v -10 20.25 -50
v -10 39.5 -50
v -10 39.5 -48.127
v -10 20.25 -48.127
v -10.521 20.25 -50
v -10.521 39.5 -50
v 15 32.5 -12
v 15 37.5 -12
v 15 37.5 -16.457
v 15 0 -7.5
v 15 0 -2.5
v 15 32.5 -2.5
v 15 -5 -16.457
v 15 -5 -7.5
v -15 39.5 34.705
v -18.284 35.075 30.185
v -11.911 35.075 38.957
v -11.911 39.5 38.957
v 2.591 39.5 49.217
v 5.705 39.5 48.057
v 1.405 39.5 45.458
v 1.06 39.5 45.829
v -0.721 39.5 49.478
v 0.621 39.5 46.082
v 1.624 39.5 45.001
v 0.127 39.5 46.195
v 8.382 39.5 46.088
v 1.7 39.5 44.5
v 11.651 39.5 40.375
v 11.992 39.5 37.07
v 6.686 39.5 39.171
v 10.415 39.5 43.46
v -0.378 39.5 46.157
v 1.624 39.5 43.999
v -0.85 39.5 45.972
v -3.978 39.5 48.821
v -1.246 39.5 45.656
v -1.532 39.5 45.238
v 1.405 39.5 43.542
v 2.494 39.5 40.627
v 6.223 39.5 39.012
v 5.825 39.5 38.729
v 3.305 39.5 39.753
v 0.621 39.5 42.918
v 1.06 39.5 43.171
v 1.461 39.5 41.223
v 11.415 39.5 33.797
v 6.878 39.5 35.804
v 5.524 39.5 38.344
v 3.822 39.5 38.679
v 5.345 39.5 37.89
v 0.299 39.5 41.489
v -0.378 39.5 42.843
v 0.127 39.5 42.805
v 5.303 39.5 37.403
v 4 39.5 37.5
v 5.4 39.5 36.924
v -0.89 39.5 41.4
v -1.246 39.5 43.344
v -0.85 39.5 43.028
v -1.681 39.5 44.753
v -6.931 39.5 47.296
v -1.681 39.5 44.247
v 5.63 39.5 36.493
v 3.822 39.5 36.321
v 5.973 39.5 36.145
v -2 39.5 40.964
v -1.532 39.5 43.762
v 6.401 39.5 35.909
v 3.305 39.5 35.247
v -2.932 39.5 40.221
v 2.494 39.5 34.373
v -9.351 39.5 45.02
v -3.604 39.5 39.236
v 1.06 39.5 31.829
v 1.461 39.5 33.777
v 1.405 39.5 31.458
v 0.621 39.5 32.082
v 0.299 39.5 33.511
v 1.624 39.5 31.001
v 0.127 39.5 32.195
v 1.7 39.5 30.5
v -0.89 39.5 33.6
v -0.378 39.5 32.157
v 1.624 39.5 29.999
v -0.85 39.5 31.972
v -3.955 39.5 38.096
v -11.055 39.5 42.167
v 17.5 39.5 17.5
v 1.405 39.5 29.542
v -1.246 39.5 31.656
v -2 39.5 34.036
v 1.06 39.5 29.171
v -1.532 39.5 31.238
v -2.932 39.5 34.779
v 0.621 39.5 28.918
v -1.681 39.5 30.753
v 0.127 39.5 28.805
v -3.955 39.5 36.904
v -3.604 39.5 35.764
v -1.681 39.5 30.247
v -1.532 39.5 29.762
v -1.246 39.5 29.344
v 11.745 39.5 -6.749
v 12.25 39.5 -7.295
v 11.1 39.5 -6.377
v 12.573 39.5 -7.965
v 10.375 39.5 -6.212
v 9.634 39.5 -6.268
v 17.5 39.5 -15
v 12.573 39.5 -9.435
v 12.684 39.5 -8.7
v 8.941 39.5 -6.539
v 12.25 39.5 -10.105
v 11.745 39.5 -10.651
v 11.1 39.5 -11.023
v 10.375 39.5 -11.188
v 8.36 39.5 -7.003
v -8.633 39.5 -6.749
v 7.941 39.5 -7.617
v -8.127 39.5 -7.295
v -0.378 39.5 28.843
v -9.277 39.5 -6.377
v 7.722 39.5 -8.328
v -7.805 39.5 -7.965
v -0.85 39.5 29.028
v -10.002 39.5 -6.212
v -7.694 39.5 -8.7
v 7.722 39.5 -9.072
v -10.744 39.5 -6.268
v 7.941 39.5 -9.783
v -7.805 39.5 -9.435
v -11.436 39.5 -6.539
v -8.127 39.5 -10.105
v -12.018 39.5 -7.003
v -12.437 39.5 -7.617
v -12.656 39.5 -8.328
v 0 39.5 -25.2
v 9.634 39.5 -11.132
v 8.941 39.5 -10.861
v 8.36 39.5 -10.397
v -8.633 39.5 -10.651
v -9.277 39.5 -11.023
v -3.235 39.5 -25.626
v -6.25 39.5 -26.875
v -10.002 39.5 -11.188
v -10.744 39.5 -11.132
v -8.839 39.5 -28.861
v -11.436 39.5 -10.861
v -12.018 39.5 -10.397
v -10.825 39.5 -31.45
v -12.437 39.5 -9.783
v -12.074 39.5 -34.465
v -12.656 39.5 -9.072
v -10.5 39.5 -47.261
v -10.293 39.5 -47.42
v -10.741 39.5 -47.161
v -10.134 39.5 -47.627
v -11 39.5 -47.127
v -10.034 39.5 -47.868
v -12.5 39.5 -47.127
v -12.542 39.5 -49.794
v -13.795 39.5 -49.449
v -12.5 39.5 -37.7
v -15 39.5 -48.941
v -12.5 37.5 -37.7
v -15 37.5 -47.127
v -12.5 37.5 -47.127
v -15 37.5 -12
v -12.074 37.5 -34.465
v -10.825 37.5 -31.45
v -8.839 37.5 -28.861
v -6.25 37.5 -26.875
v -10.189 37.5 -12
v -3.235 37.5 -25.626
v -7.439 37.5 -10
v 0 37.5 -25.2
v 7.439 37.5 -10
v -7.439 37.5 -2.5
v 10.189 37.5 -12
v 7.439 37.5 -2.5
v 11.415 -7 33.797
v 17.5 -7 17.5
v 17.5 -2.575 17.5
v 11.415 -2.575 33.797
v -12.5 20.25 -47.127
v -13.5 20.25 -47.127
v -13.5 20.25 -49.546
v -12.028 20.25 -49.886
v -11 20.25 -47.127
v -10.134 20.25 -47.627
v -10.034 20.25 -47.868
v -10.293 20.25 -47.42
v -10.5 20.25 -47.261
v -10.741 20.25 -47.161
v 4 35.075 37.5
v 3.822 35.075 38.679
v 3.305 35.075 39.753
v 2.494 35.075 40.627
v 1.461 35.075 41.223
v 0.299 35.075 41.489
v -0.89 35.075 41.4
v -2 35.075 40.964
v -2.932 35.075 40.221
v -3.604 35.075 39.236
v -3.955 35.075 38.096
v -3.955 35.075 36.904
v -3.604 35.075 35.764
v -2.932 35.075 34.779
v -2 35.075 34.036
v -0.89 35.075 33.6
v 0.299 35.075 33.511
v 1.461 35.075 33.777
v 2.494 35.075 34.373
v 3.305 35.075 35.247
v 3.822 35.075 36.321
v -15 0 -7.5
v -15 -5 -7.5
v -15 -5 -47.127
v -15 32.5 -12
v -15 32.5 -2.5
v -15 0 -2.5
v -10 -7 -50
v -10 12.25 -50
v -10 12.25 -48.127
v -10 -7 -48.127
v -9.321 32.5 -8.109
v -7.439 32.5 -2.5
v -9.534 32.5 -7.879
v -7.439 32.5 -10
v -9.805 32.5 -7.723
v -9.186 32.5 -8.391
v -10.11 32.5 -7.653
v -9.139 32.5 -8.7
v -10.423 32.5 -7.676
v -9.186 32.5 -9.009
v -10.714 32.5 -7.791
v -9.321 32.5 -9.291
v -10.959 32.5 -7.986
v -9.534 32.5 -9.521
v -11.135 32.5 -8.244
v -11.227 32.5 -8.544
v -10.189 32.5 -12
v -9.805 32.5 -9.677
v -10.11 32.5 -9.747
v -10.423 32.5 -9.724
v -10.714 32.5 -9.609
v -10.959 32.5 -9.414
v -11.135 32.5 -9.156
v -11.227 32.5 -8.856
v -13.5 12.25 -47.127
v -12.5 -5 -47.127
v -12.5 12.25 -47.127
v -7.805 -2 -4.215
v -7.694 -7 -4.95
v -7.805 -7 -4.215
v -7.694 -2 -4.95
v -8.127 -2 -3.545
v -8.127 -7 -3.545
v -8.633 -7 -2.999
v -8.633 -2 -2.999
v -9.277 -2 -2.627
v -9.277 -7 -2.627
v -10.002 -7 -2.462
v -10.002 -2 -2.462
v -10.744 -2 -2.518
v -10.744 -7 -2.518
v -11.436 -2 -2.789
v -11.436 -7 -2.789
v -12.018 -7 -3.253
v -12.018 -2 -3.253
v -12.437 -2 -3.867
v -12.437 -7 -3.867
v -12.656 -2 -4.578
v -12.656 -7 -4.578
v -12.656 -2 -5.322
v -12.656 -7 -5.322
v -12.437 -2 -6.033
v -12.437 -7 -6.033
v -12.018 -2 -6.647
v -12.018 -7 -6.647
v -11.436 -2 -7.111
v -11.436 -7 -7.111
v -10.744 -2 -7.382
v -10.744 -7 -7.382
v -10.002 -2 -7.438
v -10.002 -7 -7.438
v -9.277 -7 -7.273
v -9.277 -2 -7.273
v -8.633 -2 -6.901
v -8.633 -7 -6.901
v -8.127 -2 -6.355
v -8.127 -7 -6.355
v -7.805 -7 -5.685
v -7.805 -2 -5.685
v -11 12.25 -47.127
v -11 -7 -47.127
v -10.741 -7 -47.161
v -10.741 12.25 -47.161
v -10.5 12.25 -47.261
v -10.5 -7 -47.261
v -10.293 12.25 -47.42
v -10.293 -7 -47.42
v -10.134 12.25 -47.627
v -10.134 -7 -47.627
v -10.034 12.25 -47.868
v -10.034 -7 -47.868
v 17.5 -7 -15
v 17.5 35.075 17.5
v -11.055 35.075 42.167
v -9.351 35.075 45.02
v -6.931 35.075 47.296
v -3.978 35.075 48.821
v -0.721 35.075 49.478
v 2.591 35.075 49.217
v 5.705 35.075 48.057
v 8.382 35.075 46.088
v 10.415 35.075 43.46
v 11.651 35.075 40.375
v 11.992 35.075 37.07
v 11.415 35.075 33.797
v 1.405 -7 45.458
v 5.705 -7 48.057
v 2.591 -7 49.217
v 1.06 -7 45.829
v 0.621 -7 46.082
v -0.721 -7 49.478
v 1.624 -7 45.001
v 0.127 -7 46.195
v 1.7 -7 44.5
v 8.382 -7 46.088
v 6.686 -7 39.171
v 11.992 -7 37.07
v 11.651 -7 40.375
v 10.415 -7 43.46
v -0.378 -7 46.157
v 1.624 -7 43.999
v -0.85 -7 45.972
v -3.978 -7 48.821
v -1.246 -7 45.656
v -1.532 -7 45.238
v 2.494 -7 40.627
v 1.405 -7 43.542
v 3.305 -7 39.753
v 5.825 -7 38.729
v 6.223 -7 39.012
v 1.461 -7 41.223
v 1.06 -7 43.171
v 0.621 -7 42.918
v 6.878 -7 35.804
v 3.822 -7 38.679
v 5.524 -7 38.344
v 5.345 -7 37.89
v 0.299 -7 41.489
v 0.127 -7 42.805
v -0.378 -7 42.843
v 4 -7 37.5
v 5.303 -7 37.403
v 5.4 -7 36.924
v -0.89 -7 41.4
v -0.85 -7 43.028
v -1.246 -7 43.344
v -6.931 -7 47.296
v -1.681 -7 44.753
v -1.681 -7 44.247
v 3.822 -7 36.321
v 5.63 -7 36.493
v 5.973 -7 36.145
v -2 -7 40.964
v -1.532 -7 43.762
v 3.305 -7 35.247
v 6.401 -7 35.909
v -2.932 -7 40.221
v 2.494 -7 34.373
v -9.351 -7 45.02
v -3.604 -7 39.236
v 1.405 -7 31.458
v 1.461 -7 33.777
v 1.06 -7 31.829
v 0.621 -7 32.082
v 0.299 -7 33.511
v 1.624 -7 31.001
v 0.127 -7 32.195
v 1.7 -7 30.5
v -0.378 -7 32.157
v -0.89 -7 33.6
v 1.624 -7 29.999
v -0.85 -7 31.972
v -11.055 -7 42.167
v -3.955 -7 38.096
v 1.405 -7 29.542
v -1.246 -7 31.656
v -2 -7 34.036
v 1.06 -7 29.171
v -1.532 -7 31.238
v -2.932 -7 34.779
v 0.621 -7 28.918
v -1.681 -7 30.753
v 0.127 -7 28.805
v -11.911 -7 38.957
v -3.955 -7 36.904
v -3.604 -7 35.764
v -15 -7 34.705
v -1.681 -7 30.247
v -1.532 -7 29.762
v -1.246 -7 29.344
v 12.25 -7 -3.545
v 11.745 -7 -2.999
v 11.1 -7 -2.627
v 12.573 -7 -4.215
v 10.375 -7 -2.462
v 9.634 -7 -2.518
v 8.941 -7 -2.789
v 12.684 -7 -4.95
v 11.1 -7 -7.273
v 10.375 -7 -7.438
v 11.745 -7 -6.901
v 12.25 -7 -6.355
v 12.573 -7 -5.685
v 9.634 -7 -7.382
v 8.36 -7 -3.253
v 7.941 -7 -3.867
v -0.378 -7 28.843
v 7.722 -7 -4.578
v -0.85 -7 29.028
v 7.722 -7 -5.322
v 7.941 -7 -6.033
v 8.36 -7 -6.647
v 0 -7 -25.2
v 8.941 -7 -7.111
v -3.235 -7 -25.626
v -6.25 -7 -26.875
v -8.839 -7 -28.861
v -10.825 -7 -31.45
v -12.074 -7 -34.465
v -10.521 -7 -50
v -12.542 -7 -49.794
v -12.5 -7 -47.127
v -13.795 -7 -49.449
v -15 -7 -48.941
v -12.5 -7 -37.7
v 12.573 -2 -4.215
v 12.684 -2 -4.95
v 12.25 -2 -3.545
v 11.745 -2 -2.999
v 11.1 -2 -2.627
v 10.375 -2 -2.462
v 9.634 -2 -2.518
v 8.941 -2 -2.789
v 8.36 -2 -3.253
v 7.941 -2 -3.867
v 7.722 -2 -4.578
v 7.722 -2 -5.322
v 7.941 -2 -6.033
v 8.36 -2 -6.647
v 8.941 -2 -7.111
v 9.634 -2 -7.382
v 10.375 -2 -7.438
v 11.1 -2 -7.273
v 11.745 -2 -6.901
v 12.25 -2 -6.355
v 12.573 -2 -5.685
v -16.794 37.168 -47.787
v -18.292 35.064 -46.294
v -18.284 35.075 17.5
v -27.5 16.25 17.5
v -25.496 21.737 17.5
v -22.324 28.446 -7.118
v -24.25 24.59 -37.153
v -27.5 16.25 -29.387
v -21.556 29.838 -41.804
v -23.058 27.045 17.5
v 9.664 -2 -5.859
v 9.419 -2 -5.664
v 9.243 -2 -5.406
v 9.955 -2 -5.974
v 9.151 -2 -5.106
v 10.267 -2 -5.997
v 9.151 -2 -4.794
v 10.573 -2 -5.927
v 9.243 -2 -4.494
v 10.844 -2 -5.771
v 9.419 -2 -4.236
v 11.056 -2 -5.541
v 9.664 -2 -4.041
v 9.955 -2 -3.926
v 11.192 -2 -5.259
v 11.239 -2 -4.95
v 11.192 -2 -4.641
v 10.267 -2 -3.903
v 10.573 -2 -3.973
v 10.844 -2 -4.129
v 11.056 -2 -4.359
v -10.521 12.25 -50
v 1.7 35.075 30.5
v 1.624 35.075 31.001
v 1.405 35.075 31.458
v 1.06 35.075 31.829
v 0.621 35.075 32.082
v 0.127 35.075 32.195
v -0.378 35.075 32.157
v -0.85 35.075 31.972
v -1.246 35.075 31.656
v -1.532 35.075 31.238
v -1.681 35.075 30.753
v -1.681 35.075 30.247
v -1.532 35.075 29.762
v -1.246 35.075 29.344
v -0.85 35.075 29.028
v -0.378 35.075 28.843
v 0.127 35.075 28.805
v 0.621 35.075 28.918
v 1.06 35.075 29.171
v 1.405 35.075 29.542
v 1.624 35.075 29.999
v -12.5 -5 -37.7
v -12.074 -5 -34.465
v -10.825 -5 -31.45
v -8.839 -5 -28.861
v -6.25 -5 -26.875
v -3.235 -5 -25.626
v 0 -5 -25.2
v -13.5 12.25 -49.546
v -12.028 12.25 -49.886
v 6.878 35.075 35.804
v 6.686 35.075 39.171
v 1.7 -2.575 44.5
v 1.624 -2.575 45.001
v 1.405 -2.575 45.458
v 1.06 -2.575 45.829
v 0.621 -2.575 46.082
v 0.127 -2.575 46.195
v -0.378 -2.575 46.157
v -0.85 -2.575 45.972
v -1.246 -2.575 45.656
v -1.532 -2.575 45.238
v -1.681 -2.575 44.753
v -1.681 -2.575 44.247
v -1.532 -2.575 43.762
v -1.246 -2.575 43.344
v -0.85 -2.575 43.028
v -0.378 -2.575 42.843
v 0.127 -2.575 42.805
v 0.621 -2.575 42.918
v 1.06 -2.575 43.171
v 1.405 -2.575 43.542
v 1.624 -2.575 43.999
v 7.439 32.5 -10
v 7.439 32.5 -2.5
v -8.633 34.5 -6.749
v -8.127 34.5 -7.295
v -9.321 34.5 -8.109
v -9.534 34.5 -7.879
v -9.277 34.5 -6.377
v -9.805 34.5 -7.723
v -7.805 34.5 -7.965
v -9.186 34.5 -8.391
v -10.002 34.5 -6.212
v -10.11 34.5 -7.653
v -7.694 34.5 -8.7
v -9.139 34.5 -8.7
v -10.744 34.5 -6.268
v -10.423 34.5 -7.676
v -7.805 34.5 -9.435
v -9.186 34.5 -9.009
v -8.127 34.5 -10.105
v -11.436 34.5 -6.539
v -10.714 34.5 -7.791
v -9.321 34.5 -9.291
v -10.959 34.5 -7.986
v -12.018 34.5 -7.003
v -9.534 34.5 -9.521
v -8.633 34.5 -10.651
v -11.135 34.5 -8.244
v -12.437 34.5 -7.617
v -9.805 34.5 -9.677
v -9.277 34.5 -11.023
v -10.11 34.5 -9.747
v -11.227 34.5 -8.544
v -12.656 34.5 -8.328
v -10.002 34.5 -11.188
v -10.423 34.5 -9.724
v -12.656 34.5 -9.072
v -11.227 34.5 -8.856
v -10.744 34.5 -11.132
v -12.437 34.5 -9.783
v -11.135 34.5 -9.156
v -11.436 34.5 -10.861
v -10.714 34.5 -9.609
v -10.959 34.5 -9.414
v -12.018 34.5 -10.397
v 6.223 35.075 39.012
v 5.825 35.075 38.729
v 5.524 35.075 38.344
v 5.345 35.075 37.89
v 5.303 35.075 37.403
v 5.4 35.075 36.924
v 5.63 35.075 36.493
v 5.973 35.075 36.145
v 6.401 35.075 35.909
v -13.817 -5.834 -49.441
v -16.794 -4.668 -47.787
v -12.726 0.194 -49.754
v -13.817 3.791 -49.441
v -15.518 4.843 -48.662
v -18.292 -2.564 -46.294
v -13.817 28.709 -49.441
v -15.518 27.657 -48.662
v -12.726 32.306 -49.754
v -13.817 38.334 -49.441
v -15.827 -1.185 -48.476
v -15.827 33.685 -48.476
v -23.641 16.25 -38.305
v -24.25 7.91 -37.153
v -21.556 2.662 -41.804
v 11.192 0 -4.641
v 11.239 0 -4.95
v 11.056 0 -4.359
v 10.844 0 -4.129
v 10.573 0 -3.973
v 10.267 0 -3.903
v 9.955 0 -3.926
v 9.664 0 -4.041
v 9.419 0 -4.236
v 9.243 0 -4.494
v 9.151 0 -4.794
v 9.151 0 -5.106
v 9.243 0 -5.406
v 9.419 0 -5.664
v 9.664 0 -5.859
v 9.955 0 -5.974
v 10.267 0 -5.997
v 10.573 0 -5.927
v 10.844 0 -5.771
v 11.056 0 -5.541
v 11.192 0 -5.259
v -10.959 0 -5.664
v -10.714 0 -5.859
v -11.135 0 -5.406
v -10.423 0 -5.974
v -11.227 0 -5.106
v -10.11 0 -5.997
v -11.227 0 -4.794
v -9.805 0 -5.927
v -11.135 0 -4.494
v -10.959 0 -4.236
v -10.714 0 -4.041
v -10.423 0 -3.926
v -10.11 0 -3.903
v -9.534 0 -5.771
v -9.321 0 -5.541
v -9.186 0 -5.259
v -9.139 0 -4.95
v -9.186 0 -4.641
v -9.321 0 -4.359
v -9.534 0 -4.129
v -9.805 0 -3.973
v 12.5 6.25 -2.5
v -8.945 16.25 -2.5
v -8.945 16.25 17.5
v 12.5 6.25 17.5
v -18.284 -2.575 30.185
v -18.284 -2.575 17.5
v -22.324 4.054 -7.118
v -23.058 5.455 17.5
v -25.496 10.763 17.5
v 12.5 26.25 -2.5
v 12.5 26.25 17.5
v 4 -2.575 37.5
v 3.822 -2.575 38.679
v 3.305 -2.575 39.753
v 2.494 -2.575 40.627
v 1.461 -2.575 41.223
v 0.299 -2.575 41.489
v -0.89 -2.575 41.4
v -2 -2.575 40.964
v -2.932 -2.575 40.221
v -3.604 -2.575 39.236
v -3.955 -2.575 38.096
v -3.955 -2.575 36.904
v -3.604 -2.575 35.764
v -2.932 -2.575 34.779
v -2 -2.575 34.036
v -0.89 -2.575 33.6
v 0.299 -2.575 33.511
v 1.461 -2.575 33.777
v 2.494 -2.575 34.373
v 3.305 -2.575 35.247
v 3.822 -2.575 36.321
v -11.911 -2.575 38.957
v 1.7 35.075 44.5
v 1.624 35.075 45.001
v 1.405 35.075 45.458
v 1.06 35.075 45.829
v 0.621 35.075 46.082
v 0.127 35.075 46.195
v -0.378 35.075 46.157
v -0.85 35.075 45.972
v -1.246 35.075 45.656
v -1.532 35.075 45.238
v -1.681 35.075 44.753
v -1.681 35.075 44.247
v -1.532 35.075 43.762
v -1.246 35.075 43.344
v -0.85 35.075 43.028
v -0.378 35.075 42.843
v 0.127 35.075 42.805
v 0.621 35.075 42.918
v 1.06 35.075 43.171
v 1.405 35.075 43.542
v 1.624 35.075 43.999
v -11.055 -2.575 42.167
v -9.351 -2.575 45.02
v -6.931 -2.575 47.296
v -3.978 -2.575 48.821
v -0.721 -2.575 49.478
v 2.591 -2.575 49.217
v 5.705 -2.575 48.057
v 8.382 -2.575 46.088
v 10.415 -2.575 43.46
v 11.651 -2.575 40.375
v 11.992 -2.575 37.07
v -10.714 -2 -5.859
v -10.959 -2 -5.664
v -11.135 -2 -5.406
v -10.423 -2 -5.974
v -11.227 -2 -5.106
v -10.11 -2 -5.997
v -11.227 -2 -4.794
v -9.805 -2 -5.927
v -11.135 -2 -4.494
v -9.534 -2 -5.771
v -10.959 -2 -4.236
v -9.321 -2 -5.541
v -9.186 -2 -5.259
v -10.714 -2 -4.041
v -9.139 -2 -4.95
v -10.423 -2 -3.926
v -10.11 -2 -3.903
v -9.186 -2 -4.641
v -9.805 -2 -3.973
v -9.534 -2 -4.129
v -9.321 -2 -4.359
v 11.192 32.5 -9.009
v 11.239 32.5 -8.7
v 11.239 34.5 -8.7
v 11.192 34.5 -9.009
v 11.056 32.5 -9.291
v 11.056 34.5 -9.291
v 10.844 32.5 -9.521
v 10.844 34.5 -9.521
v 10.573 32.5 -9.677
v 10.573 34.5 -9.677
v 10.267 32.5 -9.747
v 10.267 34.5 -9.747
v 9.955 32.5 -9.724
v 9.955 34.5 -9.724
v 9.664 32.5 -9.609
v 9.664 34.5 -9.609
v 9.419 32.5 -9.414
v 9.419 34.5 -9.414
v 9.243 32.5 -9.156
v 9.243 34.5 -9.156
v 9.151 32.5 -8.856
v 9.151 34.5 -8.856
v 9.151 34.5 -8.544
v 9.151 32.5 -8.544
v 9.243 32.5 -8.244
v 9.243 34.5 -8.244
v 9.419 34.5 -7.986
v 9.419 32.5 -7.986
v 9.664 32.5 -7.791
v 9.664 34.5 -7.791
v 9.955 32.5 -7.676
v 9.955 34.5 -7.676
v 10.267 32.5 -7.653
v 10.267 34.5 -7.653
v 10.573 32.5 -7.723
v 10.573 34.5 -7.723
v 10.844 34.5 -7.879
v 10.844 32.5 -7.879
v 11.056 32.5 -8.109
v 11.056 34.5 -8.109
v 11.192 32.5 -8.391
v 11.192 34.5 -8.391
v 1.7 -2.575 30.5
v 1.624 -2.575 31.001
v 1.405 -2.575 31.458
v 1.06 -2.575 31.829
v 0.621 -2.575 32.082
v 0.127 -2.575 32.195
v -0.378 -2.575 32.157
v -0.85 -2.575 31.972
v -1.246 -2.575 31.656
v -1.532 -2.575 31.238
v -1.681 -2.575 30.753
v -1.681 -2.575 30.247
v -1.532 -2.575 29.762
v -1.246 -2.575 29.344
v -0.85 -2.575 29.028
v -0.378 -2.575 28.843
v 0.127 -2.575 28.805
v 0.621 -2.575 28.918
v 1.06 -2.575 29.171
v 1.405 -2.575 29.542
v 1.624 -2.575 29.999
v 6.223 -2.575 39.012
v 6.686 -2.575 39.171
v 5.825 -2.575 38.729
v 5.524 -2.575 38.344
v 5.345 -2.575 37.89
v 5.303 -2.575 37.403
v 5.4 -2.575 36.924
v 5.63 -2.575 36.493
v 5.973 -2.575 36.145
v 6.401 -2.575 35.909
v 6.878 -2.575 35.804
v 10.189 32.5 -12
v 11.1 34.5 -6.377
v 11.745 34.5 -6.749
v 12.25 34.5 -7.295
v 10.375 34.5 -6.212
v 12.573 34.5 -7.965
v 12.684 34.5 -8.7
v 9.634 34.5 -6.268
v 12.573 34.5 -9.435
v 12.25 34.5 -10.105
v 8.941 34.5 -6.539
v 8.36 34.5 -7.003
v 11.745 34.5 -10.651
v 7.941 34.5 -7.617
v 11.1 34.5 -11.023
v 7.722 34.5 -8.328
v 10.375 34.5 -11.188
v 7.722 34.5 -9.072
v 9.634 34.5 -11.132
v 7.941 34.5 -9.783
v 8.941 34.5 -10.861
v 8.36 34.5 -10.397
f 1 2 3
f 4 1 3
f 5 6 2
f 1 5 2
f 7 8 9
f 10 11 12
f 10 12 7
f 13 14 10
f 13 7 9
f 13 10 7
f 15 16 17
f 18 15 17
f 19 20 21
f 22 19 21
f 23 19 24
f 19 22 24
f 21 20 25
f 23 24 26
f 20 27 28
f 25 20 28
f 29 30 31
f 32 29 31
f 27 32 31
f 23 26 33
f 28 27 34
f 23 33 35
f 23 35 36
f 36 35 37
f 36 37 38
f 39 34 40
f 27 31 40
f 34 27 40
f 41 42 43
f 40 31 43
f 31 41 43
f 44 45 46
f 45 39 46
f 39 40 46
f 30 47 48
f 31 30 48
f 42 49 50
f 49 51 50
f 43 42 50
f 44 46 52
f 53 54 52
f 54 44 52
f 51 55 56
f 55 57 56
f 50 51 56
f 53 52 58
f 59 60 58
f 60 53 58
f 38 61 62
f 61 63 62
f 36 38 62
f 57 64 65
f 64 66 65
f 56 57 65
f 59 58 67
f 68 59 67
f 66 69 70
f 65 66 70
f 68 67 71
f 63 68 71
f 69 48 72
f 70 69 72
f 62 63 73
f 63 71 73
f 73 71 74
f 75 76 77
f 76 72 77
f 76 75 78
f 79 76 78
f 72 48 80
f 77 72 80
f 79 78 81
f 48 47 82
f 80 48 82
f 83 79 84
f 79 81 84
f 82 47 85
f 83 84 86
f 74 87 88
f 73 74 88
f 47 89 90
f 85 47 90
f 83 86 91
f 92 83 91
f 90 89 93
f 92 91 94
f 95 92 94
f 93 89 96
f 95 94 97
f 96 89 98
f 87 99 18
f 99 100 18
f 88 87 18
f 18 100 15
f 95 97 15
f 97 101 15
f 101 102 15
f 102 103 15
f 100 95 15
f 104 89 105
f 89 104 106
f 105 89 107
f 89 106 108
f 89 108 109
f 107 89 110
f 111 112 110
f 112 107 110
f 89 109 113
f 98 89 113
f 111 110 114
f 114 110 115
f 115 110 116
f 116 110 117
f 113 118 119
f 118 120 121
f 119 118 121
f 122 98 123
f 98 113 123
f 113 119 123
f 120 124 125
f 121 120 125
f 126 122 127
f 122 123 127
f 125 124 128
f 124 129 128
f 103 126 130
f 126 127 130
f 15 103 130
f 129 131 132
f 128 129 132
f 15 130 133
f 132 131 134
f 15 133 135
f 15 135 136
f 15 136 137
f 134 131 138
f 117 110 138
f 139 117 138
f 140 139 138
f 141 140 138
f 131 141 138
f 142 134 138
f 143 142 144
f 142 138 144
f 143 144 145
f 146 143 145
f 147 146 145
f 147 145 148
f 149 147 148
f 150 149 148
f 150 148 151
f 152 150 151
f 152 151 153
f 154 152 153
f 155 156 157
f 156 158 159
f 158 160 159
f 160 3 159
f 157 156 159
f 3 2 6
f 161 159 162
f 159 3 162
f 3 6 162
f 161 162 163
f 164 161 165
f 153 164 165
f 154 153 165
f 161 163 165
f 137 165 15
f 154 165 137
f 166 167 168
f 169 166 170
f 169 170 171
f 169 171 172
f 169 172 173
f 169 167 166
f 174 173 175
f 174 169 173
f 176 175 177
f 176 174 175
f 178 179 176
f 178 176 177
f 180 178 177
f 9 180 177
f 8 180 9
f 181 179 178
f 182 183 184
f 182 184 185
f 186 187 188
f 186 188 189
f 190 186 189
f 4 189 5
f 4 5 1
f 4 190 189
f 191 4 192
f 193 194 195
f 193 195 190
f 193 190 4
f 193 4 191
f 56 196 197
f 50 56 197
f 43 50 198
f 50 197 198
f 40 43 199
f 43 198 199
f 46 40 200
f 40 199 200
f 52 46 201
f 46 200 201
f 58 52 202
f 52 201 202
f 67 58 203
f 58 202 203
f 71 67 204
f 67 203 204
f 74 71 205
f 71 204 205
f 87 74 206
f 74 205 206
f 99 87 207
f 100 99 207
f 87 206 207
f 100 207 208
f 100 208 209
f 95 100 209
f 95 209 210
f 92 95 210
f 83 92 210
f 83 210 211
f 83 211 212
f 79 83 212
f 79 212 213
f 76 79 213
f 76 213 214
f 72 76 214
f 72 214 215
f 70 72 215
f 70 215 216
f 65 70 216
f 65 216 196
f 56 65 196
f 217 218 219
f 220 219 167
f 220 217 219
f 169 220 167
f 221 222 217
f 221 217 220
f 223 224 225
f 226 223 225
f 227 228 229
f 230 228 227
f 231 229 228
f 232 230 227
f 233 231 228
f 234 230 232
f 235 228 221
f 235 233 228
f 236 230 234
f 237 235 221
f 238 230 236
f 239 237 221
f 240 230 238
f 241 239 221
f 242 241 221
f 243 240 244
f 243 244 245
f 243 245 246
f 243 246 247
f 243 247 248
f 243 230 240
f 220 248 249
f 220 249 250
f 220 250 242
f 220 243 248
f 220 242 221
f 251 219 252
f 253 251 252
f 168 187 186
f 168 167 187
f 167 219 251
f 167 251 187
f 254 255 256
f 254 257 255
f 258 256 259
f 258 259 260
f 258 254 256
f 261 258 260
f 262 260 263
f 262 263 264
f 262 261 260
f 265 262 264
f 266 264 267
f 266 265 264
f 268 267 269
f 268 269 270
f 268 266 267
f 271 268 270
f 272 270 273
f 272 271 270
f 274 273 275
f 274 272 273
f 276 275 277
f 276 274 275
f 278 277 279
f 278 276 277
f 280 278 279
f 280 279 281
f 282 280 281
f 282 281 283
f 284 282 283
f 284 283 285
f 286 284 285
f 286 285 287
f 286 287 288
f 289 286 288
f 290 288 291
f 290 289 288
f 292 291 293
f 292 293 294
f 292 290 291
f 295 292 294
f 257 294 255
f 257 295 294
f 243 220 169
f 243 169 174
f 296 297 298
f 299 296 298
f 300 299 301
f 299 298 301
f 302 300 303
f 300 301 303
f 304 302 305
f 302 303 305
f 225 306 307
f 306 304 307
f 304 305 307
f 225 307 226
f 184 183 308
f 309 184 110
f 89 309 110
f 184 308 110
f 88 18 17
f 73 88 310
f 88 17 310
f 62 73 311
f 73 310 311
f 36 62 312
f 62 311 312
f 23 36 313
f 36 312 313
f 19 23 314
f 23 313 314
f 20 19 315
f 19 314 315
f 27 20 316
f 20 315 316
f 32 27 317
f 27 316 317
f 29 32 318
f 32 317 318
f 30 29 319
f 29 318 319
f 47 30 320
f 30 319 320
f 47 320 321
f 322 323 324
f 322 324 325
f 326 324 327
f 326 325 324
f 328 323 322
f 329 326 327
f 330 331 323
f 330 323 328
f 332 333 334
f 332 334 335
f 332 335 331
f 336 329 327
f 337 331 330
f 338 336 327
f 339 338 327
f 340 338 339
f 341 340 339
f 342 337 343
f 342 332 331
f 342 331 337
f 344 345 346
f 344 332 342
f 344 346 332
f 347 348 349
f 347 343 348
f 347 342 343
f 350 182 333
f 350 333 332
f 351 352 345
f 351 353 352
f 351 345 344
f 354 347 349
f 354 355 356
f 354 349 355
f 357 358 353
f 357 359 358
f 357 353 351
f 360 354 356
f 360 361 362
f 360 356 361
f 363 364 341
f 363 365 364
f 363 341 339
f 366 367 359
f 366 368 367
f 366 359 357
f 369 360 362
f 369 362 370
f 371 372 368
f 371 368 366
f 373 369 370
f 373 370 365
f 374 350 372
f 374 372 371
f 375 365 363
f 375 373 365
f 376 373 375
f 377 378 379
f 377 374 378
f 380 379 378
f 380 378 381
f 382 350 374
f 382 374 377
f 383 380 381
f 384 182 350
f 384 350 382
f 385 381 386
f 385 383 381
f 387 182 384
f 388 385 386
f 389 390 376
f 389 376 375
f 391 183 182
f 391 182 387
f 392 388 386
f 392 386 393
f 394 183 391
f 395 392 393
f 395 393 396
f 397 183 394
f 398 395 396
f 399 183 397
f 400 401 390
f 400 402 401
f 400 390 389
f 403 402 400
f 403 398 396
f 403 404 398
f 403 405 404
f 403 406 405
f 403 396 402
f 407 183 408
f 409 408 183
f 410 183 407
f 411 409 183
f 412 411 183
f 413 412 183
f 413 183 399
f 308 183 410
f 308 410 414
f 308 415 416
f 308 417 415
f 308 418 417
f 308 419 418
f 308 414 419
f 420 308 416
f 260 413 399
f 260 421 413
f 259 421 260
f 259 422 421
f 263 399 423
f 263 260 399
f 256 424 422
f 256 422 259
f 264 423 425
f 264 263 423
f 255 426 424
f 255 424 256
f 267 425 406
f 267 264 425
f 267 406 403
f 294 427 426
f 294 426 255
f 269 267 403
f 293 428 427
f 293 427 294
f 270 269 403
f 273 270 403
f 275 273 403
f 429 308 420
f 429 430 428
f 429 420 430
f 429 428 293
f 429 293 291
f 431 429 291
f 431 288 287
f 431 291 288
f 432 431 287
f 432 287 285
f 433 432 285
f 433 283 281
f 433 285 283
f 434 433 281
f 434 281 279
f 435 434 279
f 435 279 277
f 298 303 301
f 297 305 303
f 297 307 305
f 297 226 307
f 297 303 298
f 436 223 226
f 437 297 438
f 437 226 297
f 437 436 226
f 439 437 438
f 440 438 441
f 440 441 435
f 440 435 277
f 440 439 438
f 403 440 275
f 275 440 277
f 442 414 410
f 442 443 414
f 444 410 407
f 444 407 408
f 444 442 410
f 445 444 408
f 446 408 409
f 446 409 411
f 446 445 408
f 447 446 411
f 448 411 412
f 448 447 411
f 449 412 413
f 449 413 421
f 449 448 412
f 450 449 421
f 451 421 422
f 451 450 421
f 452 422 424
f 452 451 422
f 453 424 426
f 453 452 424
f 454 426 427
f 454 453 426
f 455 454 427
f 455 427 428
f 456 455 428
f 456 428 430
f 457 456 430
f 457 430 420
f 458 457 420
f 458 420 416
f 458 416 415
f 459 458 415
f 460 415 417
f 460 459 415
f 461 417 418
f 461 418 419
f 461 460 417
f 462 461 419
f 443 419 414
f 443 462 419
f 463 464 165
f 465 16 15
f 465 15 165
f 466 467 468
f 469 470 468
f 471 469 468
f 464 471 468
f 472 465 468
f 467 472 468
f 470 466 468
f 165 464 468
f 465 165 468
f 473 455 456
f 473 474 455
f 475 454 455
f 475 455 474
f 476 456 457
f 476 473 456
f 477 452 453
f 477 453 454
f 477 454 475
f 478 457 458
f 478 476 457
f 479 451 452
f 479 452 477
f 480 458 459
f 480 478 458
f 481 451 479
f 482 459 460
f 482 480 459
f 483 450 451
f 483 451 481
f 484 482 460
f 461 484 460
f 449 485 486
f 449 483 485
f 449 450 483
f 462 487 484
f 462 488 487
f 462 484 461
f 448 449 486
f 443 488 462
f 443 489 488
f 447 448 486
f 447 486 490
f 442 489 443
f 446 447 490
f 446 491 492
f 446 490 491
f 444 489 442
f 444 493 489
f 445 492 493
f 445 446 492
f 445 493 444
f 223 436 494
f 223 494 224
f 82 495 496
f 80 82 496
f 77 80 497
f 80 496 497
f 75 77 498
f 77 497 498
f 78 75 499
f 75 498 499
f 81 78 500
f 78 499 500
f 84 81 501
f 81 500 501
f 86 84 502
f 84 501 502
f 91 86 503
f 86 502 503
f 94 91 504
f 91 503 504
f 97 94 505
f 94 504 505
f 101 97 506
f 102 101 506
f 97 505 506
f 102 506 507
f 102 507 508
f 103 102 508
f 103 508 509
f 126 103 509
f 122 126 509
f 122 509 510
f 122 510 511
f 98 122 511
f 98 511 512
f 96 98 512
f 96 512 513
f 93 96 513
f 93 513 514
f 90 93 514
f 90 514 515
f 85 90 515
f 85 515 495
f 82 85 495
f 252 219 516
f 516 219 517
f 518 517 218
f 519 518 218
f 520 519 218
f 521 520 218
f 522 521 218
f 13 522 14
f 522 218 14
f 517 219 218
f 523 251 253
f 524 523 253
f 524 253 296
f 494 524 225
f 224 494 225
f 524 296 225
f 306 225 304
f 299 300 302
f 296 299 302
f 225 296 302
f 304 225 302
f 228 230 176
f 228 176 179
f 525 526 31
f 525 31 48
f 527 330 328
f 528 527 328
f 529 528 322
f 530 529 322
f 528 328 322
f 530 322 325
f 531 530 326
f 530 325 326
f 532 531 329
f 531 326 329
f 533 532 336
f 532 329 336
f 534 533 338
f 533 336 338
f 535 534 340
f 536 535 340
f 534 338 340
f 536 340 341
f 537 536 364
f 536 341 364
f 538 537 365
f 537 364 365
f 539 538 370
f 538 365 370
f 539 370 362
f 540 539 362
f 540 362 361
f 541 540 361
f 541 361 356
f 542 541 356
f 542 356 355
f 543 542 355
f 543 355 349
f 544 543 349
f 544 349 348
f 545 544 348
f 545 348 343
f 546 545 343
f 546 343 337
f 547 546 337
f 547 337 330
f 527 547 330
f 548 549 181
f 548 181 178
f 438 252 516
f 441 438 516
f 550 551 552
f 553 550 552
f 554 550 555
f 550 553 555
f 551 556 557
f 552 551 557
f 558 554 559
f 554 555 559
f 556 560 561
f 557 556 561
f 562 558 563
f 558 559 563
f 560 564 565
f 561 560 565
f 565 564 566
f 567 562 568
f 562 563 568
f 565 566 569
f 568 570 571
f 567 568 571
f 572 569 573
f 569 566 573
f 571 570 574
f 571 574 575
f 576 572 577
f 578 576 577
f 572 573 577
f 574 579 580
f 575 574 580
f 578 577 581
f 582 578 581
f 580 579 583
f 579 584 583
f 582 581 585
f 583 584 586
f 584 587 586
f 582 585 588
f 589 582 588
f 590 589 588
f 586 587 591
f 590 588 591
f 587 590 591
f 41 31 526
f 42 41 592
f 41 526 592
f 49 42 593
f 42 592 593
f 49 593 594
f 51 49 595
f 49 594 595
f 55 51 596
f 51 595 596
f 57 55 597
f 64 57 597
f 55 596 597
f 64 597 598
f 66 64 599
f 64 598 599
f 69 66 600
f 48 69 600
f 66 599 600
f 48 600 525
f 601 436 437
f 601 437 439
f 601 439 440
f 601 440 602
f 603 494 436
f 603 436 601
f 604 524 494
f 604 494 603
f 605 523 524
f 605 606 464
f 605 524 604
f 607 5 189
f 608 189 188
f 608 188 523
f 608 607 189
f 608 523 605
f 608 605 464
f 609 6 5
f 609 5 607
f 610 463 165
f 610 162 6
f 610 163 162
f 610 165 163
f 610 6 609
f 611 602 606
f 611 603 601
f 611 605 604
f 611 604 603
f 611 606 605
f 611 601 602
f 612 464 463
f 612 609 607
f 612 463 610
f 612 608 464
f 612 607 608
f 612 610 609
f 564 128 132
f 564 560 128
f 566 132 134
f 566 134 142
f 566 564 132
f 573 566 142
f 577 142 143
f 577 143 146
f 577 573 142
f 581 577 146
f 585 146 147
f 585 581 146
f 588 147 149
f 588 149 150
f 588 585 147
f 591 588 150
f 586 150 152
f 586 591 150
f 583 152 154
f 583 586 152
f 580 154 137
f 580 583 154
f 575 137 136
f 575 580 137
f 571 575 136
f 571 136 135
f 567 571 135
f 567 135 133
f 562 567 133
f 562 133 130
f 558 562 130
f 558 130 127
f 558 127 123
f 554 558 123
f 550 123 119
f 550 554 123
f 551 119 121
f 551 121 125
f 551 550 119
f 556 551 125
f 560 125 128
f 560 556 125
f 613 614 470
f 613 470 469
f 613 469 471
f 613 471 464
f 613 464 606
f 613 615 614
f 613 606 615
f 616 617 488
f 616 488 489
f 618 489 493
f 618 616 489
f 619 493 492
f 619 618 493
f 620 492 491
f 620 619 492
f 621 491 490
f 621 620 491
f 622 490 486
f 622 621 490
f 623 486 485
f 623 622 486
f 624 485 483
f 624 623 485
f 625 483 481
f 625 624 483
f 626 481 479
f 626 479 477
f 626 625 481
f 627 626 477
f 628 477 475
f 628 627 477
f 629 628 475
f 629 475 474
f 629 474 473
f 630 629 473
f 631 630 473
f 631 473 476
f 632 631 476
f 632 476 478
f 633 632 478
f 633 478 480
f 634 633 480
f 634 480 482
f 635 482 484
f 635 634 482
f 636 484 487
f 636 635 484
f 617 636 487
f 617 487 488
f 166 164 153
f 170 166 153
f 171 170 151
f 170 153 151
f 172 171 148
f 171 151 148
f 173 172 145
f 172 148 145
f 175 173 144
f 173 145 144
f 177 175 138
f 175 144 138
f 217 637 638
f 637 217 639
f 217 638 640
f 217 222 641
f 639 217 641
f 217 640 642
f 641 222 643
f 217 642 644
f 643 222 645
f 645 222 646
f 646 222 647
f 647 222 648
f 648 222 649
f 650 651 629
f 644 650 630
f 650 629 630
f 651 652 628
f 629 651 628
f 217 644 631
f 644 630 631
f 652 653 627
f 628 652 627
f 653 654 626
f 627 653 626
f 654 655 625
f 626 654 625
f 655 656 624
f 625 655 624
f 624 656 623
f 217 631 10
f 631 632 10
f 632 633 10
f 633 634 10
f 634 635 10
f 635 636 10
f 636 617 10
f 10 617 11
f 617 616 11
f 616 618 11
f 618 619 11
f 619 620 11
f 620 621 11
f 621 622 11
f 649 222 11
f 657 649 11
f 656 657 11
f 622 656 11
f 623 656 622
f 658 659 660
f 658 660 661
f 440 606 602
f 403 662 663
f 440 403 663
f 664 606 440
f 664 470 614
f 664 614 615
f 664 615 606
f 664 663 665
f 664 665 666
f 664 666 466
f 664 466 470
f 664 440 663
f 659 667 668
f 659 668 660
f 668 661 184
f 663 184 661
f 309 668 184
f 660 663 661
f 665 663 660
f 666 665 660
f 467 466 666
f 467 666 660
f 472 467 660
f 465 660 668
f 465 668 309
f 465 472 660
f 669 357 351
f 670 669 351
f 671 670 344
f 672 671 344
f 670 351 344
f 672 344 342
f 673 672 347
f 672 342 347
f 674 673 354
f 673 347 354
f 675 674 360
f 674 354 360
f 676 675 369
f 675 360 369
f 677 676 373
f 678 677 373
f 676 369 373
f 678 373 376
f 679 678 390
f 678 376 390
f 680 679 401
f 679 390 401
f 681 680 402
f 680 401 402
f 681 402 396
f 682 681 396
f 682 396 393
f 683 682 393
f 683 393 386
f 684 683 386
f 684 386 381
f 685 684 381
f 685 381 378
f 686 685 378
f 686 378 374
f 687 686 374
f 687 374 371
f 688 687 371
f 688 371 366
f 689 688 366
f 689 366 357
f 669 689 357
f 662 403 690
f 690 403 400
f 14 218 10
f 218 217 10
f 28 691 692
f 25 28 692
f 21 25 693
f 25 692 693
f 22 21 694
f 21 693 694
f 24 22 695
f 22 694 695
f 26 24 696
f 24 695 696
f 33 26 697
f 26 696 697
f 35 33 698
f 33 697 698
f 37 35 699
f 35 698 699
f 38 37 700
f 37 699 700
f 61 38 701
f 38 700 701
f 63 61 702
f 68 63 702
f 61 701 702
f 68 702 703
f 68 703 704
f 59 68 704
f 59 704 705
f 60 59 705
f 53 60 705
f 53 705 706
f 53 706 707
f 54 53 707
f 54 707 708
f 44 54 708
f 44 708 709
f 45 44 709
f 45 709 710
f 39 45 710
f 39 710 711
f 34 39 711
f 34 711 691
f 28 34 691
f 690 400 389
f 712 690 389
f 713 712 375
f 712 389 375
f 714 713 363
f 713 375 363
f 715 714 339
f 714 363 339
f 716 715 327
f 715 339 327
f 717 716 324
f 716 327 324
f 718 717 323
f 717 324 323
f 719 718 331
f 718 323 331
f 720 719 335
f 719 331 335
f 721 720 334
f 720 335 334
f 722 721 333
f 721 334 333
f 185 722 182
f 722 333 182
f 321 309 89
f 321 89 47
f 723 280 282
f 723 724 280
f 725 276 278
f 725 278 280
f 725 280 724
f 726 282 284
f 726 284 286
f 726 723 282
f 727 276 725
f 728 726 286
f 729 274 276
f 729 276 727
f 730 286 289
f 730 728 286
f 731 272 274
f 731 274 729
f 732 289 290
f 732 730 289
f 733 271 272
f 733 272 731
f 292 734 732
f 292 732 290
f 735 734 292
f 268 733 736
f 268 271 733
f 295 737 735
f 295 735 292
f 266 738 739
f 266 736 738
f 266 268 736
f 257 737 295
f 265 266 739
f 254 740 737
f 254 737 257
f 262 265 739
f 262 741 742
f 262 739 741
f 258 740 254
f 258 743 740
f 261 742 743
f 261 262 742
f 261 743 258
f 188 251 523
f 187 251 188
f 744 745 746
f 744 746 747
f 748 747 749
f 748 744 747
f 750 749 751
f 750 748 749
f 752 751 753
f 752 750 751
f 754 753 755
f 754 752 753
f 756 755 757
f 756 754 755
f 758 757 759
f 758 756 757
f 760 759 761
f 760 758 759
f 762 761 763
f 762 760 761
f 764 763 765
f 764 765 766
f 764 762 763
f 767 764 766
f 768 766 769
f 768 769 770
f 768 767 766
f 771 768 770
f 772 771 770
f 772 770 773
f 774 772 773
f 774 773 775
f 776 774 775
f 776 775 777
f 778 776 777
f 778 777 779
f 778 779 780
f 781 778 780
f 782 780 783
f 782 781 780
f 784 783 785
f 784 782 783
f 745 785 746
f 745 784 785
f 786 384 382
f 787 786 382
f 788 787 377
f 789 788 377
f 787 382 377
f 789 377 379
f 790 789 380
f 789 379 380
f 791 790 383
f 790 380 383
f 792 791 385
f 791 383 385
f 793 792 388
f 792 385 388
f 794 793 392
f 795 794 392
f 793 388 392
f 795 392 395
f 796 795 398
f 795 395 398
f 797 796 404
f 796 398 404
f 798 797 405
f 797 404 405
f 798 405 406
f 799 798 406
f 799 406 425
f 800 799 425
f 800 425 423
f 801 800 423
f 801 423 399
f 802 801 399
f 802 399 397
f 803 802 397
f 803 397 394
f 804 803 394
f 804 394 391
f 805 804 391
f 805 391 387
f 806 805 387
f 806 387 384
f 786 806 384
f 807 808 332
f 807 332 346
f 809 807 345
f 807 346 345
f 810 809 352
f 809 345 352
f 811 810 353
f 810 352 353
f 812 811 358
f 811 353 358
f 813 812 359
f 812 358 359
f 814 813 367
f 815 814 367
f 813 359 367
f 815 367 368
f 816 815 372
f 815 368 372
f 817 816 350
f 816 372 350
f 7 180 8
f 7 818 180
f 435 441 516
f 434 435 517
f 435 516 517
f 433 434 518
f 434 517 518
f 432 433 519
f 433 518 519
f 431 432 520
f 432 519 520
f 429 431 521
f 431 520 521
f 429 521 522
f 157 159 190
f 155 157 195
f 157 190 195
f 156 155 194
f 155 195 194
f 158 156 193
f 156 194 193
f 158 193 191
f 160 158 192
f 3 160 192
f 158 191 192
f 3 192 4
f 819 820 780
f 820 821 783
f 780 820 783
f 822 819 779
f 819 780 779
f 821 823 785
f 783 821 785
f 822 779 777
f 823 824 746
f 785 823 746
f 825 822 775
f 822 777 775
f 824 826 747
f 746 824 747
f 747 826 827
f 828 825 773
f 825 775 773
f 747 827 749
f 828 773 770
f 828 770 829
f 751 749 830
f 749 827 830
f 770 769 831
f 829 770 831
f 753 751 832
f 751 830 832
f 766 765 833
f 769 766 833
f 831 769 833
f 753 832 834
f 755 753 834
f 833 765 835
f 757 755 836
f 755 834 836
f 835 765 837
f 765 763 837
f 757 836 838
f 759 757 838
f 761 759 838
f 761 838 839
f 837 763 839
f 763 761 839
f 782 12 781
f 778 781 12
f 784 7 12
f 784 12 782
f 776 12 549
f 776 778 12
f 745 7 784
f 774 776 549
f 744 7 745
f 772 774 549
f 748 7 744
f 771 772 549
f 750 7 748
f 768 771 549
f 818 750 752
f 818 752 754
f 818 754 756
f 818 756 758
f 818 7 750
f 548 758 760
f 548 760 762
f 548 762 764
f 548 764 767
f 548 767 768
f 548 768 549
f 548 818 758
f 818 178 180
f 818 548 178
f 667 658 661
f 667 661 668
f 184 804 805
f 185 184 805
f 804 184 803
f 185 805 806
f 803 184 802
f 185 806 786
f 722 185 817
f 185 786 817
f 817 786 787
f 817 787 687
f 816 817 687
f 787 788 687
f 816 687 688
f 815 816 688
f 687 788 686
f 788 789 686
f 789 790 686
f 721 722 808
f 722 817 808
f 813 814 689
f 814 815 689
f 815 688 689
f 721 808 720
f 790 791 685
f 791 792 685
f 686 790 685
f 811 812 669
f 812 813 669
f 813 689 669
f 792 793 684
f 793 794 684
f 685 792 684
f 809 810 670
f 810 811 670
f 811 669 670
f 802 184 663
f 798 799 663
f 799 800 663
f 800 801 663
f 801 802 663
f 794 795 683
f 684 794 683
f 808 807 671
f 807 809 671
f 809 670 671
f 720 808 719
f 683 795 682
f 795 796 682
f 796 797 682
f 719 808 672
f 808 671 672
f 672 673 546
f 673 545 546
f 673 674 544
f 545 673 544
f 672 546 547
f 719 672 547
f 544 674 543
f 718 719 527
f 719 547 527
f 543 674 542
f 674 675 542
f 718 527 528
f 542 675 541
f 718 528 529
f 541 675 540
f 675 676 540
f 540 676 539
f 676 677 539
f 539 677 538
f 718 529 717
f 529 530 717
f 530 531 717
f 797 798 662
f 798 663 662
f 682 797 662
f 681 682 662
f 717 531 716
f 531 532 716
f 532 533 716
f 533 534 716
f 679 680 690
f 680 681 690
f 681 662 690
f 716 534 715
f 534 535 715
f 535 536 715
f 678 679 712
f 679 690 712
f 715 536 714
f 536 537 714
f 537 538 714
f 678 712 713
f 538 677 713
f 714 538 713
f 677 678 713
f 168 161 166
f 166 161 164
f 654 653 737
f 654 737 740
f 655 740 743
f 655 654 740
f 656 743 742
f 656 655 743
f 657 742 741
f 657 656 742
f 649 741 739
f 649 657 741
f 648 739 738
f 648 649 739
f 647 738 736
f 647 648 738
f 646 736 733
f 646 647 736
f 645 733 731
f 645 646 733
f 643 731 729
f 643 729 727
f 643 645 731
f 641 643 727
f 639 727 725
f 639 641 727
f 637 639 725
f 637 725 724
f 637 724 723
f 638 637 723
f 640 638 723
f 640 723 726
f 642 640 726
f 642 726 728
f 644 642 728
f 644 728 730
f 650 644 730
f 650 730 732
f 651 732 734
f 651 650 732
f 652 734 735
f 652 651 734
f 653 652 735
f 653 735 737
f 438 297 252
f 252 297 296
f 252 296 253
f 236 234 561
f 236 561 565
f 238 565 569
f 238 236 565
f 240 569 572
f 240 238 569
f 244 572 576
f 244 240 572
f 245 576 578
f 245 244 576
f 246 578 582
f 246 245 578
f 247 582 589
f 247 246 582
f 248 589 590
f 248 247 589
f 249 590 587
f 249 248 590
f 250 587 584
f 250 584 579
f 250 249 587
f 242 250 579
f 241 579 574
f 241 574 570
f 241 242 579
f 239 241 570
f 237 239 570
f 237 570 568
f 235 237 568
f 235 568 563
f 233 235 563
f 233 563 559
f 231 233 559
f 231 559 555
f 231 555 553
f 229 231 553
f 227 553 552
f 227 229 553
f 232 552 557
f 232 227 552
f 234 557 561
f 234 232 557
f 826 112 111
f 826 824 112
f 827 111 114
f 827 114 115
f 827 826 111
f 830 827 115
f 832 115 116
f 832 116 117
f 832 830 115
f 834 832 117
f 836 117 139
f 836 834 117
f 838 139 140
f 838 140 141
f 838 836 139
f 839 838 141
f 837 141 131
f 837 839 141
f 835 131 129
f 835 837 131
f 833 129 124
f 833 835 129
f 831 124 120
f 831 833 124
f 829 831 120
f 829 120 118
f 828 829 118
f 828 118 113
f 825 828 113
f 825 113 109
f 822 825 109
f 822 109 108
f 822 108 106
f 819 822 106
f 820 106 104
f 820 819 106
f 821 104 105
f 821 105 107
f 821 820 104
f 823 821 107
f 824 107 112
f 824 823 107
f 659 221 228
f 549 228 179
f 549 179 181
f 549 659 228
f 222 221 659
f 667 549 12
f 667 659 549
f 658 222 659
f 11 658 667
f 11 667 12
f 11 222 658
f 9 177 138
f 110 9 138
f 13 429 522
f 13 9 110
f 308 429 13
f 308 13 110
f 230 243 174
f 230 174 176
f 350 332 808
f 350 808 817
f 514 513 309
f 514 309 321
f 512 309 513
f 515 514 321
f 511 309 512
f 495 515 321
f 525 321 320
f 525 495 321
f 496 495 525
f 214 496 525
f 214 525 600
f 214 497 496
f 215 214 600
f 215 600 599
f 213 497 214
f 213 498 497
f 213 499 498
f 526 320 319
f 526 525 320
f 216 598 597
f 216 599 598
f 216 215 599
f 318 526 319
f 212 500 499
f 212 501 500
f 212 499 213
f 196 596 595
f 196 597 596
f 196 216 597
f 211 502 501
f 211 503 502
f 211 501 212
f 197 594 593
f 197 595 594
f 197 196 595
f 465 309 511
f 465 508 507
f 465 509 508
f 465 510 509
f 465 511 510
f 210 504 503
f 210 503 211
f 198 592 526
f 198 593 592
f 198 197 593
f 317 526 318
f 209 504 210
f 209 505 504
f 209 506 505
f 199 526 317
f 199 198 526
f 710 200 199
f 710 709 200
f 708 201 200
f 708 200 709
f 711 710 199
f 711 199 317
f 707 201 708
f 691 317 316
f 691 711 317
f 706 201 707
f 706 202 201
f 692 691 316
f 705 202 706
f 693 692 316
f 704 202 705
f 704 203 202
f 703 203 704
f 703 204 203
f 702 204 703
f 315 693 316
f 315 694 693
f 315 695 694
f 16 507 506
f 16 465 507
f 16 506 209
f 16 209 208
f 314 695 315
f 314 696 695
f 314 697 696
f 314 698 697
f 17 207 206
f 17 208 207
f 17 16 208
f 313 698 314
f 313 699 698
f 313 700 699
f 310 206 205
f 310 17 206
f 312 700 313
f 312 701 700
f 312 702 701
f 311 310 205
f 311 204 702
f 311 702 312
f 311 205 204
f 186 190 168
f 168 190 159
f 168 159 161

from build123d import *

# Parameters (mm, degrees)
BOSS_EXTRUDE1_DEPTH  = 32.5
SKETCH4_R            = 1.05
BOSS_EXTRUDE2_DEPTH  = 2
SKETCH7_R            = 2.495
WIRE_SPACING2_DEPTH  = 3
SKETCH8_W            = 35
SKETCH8_H            = 37.7
SKETCH8_R            = 2.495
BOSS_EXTRUDE6_DEPTH  = 2
SKETCH5_R            = 1.05
BOSS_EXTRUDE3_DEPTH  = 2
SKETCH9_R            = 2.495
WIRE_SPACING1_DEPTH  = 3
SKETCH10_W           = 35
SKETCH10_H           = 37.7
SKETCH10_R           = 2.495
BOSS_EXTRUDE8_DEPTH  = 2
SKETCH11_R           = 12.5
CUT_EXTRUDE1_DEPTH   = 47.5
CUT_EXTRUDE2_DEPTH   = 47.5
SKETCH13_W           = 45
SKETCH13_H           = 46.5
BOSS_EXTRUDE9_DEPTH  = 17.5
SKETCH15_W           = 12.5
SKETCH15_H           = 46.5
BOSS_EXTRUDE10_DEPTH = 50
SKETCH18_R           = 4
SKETCH18_R_2         = 1.7
BOSS_EXTRUDE11_DEPTH = 46.5
BOSS_EXTRUDE13_DEPTH = 46.5
SKETCH21_W           = 89.912502986
SKETCH21_H           = 37.65
CUT_EXTRUDE3_DEPTH   = 46
CUT_EXTRUDE5_DEPTH   = 47.5
CUT_EXTRUDE4_START   = -50.5000001
CUT_EXTRUDE4_DEPTH   = 101.5000002
CUT_EXTRUDE6_DEPTH   = 53.0000001
BOSS_EXTRUDE14_DEPTH = 46.5
FILLET2_R            = 10
SKETCH29_W           = 2.5
SKETCH29_H           = 42.5
CUT_EXTRUDE8_DEPTH   = 9.427041
FILLET3_R            = 1
SKETCH30_W           = 7.311581117
SKETCH30_H           = 8
CUT_EXTRUDE9_DEPTH   = 22.5


with BuildPart() as part:
    # Sketch2 → Boss-Extrude1 (new body)
    with BuildSketch(Plane(origin=(0, 0, 0), x_dir=(1, 0, 0), z_dir=(0, 1, 0))):
        Polygon((17.5, 0), (17.5, 37.7), (15, 37.7), (15, 2.5), (-15, 2.5), (-15, 37.7), (-17.5, 37.7), (-17.5, 0), align=None)
    extrude(amount=BOSS_EXTRUDE1_DEPTH)

    # Sketch4 → Boss-Extrude2 (add)
    with BuildSketch(Plane.XZ):
        Polygon((-17.5, 0), (-17.5, -7.443777264), (-17.5, -37.7), (-15, -37.7), (-15, -7.5), (15, -7.5), (15, -37.7), (17.5, -37.7), (17.5, -7.443777264), (17.5, 0), align=None)
        with Locations((-10.1889, -4.95)):
            Circle(SKETCH4_R, mode=Mode.SUBTRACT)
        with Locations((10.1889, -4.95)):
            Circle(SKETCH4_R, mode=Mode.SUBTRACT)
    extrude(amount=BOSS_EXTRUDE2_DEPTH)

    # Sketch7 → Wire spacing2 (add)
    with BuildSketch(Plane.XZ.offset(2)):
        Polygon((-17.5, 0), (-17.5, -37.7), (-15, -37.7), (-15, -7.5), (15, -7.5), (15, -37.7), (17.5, -37.7), (17.5, 0), align=None)
        with Locations((-10.1889, -4.95)):
            Circle(SKETCH7_R, mode=Mode.SUBTRACT)
        with Locations((10.1889, -4.95)):
            Circle(SKETCH7_R, mode=Mode.SUBTRACT)
    extrude(amount=WIRE_SPACING2_DEPTH)

    # Sketch8 → Boss-Extrude6 (add)
    with BuildSketch(Plane.XZ.offset(5)):
        with Locations((0, -18.85)):
            Rectangle(SKETCH8_W, SKETCH8_H)
        with Locations((-10.1889, -4.95)):
            Circle(SKETCH8_R, mode=Mode.SUBTRACT)
        with Locations((10.1889, -4.95)):
            Circle(SKETCH8_R, mode=Mode.SUBTRACT)
    extrude(amount=BOSS_EXTRUDE6_DEPTH)

    # Sketch5 → Boss-Extrude3 (add)
    with BuildSketch(Plane(origin=(0, 32.5, 0), x_dir=(1, 0, 0), z_dir=(0, 1, 0))):
        Polygon((-7.439, 10), (-7.439, 2.5), (7.439, 2.5), (7.439, 10), (10.1889, 12), (15, 12), (15, 37.7), (17.5, 37.7), (17.5, 0), (-17.5, 0), (-17.5, 37.7), (-15, 37.7), (-15, 12), (-10.1889, 12), align=None)
        with Locations((-10.1889, 8.7)):
            Circle(SKETCH5_R, mode=Mode.SUBTRACT)
        with Locations((10.1889, 8.7)):
            Circle(SKETCH5_R, mode=Mode.SUBTRACT)
    extrude(amount=BOSS_EXTRUDE3_DEPTH)

    # Sketch9 → Wire spacing1 (add)
    with BuildSketch(Plane(origin=(0, 34.5, 0), x_dir=(1, 0, 0), z_dir=(0, 1, 0))):
        Polygon((-17.5, 0), (-17.5, 37.7), (-15, 37.7), (-15, 12), (-10.1889, 12), (-7.439, 10), (-7.439, 2.5), (7.439, 2.5), (7.439, 10), (10.1889, 12), (15, 12), (15, 37.7), (17.5, 37.7), (17.5, 0), align=None)
        with Locations((-10.1889, 8.7)):
            Circle(SKETCH9_R, mode=Mode.SUBTRACT)
        with Locations((10.1889, 8.7)):
            Circle(SKETCH9_R, mode=Mode.SUBTRACT)
    extrude(amount=WIRE_SPACING1_DEPTH)

    # Sketch10 → Boss-Extrude8 (add)
    with BuildSketch(Plane(origin=(0, 37.5, 0), x_dir=(1, 0, 0), z_dir=(0, 1, 0))):
        with Locations((0, 18.85)):
            Rectangle(SKETCH10_W, SKETCH10_H)
        with Locations((-10.1889, 8.7)):
            Circle(SKETCH10_R, mode=Mode.SUBTRACT)
        with Locations((10.1889, 8.7)):
            Circle(SKETCH10_R, mode=Mode.SUBTRACT)
    extrude(amount=BOSS_EXTRUDE8_DEPTH)

    # Sketch11 → Cut-Extrude1 (cut, through all)
    with BuildSketch(Plane(origin=(0, 39.5, 0), x_dir=(1, 0, 0), z_dir=(0, 1, 0))):
        with Locations((0, 37.7)):
            Circle(SKETCH11_R)
    extrude(amount=-CUT_EXTRUDE1_DEPTH, mode=Mode.SUBTRACT)

    # Sketch12 → Cut-Extrude2 (cut, through all)
    with BuildSketch(Plane.XZ.offset(7)):
        Polygon((0, -25.2), (17.5, -15), (17.5, -47.484525272), align=None)
    extrude(amount=-CUT_EXTRUDE2_DEPTH, mode=Mode.SUBTRACT)

    # Sketch13 → Boss-Extrude9 (add)
    with BuildSketch(Plane.XY):
        with Locations((-5, 16.25)):
            Rectangle(SKETCH13_W, SKETCH13_H)
    extrude(amount=BOSS_EXTRUDE9_DEPTH)

    # Sketch15 → Boss-Extrude10 (add)
    with BuildSketch(Plane(origin=(0, 0, 0), x_dir=(-1, 0, 0), z_dir=(0, 0, -1))):
        with Locations((21.25, 16.25)):
            Rectangle(SKETCH15_W, SKETCH15_H)
    extrude(amount=BOSS_EXTRUDE10_DEPTH)

    # Sketch18 → Boss-Extrude11 (add)
    with BuildSketch(Plane.XZ.offset(7)):
        with BuildLine():
            Line((12.5, 22.5), (12.5, 17.5))
            Line((12.5, 17.5), (-12.5, 17.5))
            Line((-12.5, 17.5), (-12.5, 22.5))
            Line((-12.5, 22.5), (-9.367496998, 30))
            ThreePointArc((-9.367496998, 30), (0, 49.5), (9.367496998, 30))
            Line((9.367496998, 30), (12.5, 22.5))
        make_face()
        with Locations((0, 37.5)):
            Circle(SKETCH18_R, mode=Mode.SUBTRACT)
        with Locations((0, 30.5)):
            Circle(SKETCH18_R_2, mode=Mode.SUBTRACT)
        with Locations((-7, 37.5)):
            Circle(SKETCH18_R_2, mode=Mode.SUBTRACT)
        with Locations((0, 44.5)):
            Circle(SKETCH18_R_2, mode=Mode.SUBTRACT)
        with Locations((7, 37.5)):
            Circle(SKETCH18_R_2, mode=Mode.SUBTRACT)
    extrude(amount=-BOSS_EXTRUDE11_DEPTH)

    # Sketch22 → Boss-Extrude13 (add)
    with BuildSketch(Plane.XZ.offset(7)):
        Polygon((-27.5, 17.5), (-5.066300312, 48.378078928), (-5.066300312, 17.5), align=None)
        Polygon((17.5, 17.5), (6.194336088, 47.777655396), (7.922300343, 17.5), align=None)
    extrude(amount=-BOSS_EXTRUDE13_DEPTH)

    # Sketch21 → Cut-Extrude3 (cut, through all)
    with BuildSketch(Plane.ZY.offset(27.5)):
        with Locations((62.456251493, 16.25)):
            Rectangle(SKETCH21_W, SKETCH21_H)
    extrude(amount=-CUT_EXTRUDE3_DEPTH, mode=Mode.SUBTRACT)

    # Sketch26 → Cut-Extrude5 (cut, through all)
    with BuildSketch(Plane(origin=(0, 39.5, 0), x_dir=(1, 0, 0), z_dir=(0, 1, 0))):
        with BuildLine():
            Line((-27.5, 29.387171818), (-27.5, 50))
            Line((-27.5, 50), (-15, 50))
            add(Edge.make_bspline(
                [(-15, 50), (-23.594741162, 41.153529081), (-27.5, 29.387171818)],
                knots=[0, 0, 0, 1, 1, 1], degree=2))
        make_face()
    extrude(amount=-CUT_EXTRUDE5_DEPTH, mode=Mode.SUBTRACT)

    # Sketch24 → Cut-Extrude4 (cut)
    with BuildSketch(Plane(origin=(0, 0, 0), x_dir=(-1, 0, 0), z_dir=(0, 0, -1)).offset(CUT_EXTRUDE4_START)):
        with BuildLine():
            Line((15, -7), (27.5, -7))
            Line((27.5, -7), (27.5, 16.25))
            add(Edge.make_bspline(
                [(27.5, 16.25), (23.398461901, 3.482399142), (15, -7)],
                knots=[0, 0, 0, 1, 1, 1], degree=2))
        make_face()
    cut_extrude4 = extrude(amount=CUT_EXTRUDE4_DEPTH, mode=Mode.SUBTRACT)

    # Mirror1: Cut-Extrude4 across plane
    add(cut_extrude4.mirror(Plane(origin=(0, 16.25, 0), x_dir=(0, 0, 1), z_dir=(0, -1, 0))), mode=Mode.SUBTRACT)

    # Sketch27 → Cut-Extrude6 (cut, through all)
    with BuildSketch(Plane(origin=(0, 0, -2.5), x_dir=(-1, 0, 0), z_dir=(0, 0, -1))):
        Polygon((-12.5, 26.25), (8.945069205, 16.25), (-12.5, 6.25), align=None)
    extrude(amount=-CUT_EXTRUDE6_DEPTH, mode=Mode.SUBTRACT)

    # Sketch28 → Boss-Extrude14 (add)
    with BuildSketch(Plane(origin=(0, 39.5, 0), x_dir=(1, 0, 0), z_dir=(0, 1, 0))):
        Polygon((-15, 37.7), (-15, 50), (-10, 50), (-10, 47.127040762), (-12.5, 47.127040762), (-12.5, 37.7), align=None)
    extrude(amount=-BOSS_EXTRUDE14_DEPTH)

    # Fillet2
    fillet2_edges = [part.edges().sort_by_distance(p)[0] for p in [
        (-15, 16.25, -50),
    ]]
    fillet(fillet2_edges, radius=FILLET2_R)

    # Sketch29 → Cut-Extrude8 (cut)
    with BuildSketch(Plane.XY.offset(-37.7)):
        with Locations((-13.75, 16.25)):
            Rectangle(SKETCH29_W, SKETCH29_H)
    extrude(amount=-CUT_EXTRUDE8_DEPTH, mode=Mode.SUBTRACT)

    # Fillet3
    fillet3_edges = [part.edges().sort_by_distance(p)[0] for p in [
        (-10, 16.25, -47.127040762),
    ]]
    fillet(fillet3_edges, radius=FILLET3_R)

    # Sketch30 → Cut-Extrude9 (cut)
    with BuildSketch(Plane.XY.offset(-47.127040762)):
        with Locations((-9.844209442, 16.25)):
            Rectangle(SKETCH30_W, SKETCH30_H)
    extrude(amount=-CUT_EXTRUDE9_DEPTH, mode=Mode.SUBTRACT)


solid = part.part
